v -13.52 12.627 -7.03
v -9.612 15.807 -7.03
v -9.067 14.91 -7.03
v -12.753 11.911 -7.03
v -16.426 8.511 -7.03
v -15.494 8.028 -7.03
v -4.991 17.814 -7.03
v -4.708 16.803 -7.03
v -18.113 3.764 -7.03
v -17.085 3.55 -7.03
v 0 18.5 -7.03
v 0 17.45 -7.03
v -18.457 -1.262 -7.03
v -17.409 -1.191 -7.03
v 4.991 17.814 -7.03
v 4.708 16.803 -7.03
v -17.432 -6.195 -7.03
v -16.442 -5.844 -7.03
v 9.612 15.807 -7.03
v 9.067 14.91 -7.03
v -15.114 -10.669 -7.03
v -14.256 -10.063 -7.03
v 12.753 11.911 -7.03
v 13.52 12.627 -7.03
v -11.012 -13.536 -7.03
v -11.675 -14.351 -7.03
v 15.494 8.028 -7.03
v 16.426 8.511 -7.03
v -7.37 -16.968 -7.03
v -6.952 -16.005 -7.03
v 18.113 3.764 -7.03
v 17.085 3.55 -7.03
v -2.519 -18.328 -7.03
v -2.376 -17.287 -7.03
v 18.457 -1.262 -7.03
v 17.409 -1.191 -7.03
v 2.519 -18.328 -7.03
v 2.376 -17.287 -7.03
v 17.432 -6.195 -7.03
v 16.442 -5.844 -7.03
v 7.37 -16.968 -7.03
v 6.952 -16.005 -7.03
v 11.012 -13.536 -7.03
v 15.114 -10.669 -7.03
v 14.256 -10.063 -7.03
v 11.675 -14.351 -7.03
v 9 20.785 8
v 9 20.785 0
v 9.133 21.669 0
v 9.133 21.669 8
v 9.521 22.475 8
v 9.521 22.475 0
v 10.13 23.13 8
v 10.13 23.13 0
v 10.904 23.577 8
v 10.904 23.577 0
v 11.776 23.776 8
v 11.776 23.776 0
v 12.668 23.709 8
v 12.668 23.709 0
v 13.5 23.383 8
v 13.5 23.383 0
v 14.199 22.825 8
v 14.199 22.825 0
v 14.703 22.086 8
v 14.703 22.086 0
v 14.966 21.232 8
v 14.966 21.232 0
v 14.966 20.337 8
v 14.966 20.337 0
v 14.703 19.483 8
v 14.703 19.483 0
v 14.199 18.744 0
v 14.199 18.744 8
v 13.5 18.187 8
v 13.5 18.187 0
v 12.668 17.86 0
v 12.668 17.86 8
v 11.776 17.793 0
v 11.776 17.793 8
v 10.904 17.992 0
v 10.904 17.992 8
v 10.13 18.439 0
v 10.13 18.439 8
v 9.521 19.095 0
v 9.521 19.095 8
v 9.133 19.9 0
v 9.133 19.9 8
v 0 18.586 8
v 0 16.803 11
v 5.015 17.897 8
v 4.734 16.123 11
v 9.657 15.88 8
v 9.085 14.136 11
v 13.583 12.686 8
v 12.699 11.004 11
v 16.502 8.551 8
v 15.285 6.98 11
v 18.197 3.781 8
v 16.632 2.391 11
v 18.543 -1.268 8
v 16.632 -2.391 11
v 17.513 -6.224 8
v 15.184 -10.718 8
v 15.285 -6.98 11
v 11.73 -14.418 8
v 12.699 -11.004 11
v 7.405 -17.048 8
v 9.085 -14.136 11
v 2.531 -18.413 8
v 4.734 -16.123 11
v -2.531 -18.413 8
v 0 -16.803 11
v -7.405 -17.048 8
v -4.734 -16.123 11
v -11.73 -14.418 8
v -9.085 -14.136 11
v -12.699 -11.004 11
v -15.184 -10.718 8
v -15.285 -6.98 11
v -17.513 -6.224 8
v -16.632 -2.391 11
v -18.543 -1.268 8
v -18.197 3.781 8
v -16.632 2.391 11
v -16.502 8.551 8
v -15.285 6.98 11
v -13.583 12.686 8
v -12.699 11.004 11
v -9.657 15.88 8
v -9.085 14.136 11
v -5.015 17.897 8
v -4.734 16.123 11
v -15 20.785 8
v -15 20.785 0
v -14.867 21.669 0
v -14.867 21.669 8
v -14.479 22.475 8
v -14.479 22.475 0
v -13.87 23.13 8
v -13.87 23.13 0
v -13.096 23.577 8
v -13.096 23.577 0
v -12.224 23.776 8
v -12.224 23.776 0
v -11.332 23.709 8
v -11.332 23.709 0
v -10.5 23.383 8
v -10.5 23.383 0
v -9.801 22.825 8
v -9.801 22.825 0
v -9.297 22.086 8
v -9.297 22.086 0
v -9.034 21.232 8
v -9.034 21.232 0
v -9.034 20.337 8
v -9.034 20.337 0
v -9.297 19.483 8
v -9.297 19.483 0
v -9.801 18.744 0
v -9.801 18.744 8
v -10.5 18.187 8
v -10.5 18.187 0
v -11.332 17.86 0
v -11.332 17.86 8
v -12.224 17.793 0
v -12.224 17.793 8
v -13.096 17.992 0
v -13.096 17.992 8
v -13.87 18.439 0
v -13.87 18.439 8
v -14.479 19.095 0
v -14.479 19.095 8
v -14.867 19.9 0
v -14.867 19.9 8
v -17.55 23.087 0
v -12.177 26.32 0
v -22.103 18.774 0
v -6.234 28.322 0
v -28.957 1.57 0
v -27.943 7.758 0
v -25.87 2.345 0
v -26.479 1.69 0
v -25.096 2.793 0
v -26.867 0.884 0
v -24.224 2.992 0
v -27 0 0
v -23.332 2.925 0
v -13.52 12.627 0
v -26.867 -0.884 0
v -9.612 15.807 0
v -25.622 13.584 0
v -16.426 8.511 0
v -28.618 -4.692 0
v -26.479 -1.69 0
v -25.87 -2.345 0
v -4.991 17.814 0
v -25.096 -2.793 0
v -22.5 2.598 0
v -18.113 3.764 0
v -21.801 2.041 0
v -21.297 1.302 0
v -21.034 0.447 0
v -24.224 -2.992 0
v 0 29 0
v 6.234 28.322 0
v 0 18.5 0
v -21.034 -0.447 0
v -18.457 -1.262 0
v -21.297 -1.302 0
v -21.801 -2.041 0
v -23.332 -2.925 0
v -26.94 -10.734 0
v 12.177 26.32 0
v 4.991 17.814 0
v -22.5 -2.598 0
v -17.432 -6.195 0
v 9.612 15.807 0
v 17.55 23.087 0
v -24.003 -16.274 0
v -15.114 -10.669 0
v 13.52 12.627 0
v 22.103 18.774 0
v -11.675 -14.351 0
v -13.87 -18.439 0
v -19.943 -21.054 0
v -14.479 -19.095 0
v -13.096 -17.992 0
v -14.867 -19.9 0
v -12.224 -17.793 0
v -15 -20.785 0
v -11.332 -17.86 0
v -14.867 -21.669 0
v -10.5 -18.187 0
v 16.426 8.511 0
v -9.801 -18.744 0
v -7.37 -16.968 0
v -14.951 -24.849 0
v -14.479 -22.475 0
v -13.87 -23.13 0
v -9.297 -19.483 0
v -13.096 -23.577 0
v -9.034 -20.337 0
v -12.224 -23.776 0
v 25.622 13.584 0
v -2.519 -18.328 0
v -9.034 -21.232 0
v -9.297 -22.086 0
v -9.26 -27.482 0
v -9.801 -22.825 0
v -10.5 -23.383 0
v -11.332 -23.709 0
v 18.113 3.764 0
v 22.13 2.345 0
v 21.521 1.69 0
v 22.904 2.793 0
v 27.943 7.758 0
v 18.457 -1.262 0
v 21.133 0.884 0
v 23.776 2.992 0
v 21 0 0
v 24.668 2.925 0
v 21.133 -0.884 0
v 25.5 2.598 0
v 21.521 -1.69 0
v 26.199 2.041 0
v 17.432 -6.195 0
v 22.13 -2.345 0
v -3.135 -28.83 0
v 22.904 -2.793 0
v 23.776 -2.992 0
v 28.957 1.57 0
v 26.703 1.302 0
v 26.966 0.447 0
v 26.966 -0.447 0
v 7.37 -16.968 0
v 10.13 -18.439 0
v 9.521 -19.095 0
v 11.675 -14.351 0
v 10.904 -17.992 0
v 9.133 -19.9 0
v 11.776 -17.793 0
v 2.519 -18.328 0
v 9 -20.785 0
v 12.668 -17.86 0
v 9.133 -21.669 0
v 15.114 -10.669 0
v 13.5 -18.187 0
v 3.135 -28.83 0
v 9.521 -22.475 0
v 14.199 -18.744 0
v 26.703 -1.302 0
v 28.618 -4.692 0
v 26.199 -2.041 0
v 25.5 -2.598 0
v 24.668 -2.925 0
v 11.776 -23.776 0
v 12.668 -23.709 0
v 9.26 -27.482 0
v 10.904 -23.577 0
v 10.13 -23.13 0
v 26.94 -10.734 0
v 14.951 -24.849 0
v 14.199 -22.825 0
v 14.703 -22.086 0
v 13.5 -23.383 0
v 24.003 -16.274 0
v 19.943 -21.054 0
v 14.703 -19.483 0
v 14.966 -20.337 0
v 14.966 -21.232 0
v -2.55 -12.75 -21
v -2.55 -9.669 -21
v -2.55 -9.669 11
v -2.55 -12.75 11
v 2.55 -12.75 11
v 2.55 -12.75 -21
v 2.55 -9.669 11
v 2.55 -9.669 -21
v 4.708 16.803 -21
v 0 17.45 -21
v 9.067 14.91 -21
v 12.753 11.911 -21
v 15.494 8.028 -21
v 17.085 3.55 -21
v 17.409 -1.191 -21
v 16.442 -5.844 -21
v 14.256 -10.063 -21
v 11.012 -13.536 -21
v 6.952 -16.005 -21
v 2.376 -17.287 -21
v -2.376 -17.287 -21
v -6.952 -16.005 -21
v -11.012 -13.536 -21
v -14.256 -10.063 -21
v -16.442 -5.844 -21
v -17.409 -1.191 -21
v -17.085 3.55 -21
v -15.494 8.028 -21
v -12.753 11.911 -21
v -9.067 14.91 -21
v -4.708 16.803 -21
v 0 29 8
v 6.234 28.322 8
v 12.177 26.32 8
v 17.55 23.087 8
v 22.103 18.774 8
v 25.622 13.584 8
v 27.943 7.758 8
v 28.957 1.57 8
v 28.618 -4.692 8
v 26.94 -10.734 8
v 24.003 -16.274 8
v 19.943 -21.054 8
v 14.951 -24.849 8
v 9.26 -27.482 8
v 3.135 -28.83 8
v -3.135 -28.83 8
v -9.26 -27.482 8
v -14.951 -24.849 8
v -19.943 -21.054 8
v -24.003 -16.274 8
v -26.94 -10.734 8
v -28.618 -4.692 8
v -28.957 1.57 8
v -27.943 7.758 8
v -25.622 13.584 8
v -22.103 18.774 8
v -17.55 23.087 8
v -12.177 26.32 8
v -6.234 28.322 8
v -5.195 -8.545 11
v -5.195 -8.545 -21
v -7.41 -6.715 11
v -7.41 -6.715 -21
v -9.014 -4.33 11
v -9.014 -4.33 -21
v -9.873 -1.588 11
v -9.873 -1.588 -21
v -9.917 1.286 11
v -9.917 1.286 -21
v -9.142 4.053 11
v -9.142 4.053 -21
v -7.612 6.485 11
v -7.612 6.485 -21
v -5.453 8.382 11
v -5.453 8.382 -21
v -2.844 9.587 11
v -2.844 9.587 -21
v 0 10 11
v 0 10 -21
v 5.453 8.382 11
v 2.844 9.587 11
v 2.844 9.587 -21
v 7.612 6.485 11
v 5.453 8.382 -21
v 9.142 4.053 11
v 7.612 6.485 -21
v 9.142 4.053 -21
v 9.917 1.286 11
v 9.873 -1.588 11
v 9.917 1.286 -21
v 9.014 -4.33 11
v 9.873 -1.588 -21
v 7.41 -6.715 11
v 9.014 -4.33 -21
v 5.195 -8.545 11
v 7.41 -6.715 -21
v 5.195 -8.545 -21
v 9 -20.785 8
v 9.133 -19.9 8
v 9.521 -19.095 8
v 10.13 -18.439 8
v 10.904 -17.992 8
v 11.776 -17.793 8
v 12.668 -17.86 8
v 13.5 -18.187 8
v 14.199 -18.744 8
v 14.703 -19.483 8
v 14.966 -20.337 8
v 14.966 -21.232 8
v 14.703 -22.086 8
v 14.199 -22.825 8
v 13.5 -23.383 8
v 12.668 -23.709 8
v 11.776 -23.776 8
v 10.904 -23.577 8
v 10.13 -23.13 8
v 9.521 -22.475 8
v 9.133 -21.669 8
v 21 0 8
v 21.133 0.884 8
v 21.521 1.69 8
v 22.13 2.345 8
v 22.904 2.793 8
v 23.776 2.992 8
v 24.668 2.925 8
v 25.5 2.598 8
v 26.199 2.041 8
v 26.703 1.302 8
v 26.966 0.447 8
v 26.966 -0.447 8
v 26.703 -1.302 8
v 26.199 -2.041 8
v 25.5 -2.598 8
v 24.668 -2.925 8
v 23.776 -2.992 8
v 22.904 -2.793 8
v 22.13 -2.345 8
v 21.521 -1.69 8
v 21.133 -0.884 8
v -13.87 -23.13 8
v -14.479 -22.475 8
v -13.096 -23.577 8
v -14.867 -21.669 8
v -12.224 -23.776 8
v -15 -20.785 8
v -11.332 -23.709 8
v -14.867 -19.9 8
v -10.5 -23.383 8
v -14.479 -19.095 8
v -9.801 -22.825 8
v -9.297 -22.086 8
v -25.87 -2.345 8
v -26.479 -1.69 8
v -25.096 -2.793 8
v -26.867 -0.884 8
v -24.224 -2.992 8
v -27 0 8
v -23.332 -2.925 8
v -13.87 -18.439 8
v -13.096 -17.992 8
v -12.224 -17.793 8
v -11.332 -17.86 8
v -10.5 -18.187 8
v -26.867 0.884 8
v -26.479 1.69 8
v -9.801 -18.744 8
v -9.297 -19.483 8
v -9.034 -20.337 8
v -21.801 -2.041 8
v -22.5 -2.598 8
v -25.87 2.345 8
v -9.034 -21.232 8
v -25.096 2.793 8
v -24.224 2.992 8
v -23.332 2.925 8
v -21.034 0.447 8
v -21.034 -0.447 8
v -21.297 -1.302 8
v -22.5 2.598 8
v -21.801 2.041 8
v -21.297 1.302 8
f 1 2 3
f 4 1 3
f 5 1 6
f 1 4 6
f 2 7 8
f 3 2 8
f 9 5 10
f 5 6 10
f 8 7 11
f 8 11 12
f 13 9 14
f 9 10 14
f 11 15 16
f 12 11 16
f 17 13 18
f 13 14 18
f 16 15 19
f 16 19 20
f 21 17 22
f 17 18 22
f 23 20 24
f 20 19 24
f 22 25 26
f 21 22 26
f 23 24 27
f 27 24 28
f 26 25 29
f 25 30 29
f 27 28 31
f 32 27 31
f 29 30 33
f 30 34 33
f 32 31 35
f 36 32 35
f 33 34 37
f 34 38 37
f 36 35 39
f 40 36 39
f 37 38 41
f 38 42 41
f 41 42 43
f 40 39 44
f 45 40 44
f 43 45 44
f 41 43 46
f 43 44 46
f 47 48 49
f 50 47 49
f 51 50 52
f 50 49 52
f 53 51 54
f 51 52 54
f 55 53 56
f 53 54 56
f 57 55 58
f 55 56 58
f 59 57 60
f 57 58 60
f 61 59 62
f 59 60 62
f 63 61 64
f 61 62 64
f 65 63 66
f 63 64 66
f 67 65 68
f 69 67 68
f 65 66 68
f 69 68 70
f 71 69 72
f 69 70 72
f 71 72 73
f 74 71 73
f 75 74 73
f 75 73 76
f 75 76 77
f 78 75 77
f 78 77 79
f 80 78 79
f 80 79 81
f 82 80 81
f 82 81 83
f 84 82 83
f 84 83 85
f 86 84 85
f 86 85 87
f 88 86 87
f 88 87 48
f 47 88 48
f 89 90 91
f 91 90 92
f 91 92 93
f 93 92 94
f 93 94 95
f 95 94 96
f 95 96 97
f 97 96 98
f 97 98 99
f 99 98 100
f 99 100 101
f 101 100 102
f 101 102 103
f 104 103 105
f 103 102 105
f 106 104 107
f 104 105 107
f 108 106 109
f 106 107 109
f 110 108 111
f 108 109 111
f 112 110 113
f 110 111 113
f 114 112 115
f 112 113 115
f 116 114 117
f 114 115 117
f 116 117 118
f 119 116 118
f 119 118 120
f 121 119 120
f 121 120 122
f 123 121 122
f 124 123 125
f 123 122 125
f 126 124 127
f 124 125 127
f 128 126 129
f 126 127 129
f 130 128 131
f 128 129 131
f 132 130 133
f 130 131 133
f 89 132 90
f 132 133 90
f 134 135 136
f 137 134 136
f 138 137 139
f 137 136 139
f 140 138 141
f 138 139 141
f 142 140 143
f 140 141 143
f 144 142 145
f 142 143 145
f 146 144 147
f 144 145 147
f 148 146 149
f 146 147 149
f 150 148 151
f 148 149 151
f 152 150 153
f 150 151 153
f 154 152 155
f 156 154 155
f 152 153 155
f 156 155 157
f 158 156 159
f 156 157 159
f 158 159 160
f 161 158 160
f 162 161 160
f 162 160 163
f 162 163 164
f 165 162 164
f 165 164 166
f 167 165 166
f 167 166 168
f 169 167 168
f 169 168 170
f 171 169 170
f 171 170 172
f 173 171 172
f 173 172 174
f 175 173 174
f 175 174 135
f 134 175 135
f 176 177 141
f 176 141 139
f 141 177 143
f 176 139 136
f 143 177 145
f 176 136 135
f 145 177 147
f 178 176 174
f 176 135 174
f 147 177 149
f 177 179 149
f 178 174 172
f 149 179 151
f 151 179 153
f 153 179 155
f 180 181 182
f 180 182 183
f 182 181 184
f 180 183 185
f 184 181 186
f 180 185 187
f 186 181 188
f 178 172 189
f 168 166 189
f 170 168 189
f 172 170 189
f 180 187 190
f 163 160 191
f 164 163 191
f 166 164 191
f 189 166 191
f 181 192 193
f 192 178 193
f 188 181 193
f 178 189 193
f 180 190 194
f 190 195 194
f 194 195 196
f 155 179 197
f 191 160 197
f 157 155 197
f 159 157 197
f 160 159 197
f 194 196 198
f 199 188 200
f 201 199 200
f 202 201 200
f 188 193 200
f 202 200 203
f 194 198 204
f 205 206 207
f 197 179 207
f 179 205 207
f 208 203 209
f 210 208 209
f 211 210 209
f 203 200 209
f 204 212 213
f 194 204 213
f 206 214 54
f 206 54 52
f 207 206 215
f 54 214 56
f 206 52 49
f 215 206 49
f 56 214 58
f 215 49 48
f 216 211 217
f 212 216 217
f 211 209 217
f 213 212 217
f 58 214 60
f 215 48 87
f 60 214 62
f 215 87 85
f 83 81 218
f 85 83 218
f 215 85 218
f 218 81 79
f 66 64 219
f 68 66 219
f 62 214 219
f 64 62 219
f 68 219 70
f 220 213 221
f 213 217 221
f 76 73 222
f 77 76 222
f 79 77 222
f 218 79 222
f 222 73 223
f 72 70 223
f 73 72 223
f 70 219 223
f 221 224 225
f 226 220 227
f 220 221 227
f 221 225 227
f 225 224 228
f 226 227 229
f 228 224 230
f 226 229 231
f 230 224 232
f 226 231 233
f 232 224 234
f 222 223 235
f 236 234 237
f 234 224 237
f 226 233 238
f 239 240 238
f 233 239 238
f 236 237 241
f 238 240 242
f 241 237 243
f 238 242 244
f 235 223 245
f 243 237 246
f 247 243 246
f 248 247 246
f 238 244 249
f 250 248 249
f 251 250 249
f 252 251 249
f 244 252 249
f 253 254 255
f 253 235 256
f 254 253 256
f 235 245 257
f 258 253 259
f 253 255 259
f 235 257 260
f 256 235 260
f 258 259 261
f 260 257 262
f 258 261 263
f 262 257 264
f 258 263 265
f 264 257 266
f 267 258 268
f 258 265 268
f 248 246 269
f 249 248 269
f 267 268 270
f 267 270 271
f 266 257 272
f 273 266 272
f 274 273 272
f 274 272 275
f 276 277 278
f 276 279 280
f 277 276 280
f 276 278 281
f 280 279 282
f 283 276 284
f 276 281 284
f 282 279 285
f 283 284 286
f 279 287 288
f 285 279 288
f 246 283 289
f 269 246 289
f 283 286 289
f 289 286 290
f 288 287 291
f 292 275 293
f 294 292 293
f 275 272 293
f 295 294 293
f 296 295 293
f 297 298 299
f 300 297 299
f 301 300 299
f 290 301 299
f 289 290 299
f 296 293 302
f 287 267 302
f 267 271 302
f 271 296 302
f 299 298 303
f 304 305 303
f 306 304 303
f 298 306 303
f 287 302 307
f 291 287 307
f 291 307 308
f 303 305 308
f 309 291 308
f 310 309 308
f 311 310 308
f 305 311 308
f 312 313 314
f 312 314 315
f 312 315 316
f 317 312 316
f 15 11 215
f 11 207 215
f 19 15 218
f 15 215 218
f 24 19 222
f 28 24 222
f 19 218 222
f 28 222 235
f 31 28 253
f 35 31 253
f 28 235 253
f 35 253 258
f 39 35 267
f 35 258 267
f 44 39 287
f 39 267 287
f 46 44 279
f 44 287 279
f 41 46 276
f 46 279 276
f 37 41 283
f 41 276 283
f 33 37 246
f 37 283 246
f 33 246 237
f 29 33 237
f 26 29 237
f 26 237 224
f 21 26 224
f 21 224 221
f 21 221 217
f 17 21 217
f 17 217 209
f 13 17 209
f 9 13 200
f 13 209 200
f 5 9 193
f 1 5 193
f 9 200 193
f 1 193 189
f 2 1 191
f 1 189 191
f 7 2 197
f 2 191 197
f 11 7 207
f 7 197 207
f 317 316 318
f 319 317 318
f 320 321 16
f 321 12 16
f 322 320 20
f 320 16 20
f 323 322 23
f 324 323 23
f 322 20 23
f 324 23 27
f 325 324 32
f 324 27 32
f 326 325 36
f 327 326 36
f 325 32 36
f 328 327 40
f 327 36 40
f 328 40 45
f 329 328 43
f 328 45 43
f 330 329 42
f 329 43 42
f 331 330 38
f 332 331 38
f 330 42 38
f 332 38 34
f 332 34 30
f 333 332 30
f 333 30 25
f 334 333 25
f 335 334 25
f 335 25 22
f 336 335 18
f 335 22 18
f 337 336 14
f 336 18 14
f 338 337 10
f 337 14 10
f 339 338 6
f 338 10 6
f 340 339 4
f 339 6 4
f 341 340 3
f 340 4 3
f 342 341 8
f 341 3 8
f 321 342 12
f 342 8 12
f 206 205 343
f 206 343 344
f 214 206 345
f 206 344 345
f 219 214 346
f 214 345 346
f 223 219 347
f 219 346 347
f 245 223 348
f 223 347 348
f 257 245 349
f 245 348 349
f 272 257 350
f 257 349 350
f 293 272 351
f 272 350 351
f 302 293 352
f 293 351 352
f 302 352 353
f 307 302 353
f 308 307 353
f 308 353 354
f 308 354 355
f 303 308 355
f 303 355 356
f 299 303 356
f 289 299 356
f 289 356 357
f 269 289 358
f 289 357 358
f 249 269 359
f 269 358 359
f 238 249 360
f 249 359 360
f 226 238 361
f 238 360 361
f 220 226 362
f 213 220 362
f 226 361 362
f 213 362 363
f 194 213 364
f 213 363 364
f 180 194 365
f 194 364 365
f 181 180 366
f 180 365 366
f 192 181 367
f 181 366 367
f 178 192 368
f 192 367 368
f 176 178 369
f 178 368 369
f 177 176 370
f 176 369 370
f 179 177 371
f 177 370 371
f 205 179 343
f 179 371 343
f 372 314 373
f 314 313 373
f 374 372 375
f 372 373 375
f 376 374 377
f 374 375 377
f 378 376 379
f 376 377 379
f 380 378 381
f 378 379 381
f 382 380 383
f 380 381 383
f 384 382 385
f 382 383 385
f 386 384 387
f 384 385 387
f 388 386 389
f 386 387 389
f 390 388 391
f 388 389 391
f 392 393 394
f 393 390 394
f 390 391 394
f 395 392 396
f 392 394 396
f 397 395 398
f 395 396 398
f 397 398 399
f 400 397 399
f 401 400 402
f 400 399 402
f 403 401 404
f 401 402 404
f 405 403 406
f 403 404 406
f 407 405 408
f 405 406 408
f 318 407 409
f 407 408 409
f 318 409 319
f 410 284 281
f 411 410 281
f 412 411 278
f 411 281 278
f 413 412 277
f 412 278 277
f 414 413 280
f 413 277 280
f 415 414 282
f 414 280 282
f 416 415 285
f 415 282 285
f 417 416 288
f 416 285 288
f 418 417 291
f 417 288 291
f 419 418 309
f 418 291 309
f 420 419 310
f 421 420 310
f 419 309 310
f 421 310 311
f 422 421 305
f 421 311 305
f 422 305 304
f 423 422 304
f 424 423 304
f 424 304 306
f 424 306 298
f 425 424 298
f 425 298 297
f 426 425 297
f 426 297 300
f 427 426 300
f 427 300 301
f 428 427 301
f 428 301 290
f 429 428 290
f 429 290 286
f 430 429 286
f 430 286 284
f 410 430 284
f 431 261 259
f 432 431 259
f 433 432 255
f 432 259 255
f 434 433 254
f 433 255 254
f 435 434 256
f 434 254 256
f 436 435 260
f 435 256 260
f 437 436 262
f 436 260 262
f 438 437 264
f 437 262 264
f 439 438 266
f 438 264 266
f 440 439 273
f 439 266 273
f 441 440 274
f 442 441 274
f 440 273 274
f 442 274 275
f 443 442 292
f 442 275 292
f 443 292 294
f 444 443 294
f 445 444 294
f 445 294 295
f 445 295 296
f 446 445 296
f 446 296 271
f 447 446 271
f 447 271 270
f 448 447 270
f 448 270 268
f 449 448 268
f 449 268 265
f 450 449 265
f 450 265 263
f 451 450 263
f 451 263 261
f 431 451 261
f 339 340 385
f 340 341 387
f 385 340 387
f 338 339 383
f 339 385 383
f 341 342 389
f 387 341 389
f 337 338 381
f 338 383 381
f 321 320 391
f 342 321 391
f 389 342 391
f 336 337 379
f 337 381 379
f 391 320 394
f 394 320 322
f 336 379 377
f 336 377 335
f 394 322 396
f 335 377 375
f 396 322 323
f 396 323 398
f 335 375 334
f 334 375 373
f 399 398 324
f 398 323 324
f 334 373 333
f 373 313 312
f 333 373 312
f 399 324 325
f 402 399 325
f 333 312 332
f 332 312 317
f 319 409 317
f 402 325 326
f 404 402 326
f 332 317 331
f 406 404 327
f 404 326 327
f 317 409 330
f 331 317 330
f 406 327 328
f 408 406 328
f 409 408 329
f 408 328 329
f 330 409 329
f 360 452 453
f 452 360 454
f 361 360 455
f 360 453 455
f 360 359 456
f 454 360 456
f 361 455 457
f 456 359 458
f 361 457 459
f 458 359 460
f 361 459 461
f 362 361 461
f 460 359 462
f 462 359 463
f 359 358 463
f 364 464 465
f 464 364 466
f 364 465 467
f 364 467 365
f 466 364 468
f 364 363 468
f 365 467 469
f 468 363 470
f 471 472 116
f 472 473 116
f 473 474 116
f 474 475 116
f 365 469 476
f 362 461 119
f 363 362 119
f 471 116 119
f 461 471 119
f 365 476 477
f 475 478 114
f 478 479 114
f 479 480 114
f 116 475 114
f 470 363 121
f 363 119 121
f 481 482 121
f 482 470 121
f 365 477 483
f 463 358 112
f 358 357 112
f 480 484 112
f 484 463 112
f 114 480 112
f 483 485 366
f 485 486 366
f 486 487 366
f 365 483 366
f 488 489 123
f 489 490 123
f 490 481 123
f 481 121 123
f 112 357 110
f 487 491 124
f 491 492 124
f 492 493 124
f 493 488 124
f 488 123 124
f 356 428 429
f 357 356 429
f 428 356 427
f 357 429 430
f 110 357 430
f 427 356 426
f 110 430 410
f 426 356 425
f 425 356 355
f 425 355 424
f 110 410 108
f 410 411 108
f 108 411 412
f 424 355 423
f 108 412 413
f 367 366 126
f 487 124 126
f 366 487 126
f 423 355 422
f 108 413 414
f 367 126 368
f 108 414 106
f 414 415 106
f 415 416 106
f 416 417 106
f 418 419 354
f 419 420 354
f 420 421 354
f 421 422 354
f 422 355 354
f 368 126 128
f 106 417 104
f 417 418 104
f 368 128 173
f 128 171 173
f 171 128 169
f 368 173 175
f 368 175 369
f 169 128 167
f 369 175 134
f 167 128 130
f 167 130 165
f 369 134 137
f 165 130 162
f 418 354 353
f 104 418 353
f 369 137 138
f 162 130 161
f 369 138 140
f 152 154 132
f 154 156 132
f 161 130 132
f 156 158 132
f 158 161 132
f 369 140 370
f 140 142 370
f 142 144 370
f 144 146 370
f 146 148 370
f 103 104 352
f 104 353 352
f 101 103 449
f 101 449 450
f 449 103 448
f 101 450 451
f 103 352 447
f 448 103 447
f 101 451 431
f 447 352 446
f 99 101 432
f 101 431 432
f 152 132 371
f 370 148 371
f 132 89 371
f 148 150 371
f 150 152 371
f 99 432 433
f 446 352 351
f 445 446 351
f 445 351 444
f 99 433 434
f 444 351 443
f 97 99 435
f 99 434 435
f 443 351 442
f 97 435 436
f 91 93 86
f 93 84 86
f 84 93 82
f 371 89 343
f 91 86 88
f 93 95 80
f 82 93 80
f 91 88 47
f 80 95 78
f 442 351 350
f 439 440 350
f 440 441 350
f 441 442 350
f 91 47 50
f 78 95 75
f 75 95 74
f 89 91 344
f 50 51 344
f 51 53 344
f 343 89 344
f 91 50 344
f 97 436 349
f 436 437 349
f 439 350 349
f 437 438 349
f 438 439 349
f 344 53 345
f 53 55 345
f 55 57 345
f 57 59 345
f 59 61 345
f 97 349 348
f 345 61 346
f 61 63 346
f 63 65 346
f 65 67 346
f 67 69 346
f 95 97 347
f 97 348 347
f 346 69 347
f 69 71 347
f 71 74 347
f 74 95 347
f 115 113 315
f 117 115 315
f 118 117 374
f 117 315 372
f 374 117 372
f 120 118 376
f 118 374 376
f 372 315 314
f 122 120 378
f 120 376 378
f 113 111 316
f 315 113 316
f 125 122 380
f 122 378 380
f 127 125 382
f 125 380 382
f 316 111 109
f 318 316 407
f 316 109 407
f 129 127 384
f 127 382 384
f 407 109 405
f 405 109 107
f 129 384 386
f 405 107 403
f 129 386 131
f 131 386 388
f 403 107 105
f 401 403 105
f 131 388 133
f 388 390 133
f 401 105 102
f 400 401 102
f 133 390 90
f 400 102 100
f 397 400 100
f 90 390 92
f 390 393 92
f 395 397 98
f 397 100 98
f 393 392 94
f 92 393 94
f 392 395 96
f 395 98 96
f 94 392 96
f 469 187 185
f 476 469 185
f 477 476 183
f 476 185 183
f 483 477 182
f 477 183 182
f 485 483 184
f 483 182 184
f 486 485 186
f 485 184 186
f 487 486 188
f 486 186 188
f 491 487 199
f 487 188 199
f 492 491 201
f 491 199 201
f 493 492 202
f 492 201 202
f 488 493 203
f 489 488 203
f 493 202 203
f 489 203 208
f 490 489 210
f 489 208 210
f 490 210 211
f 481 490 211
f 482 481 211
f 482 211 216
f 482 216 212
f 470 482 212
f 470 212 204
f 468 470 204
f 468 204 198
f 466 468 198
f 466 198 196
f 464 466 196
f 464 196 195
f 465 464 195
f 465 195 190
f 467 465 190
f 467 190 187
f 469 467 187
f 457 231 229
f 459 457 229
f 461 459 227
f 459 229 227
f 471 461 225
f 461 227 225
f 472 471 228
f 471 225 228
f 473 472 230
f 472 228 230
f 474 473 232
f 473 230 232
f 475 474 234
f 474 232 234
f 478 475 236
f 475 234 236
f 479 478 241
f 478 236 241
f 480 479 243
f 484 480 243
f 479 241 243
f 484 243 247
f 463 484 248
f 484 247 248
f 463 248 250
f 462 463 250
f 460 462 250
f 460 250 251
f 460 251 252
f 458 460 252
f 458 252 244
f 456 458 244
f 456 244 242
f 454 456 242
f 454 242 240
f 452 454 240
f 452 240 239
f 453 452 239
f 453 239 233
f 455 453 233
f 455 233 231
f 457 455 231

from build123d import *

# Parameters (mm, degrees)
CUT_EXTRUDE1_DEPTH      = 12
CUT_EXTRUDE1_DEPTH_BACK = 22
SKETCH3_R               = 3
CUT_EXTRUDE2_DEPTH      = 22
CUT_EXTRUDE2_DEPTH_BACK = 12


with BuildPart() as part:
    # Sketch1 → Revolve1 (revolve)
    with BuildSketch(Plane(origin=(0, 0, 0), x_dir=(0, 0, -1), z_dir=(1, 0, 0))):
        Polygon((21, 17.45), (7.03, 17.45), (7.03, 18.5), (0, 18.5), (0, 29), (-8, 29), (-8, 18.586235054), (-11, 16.803216346), (-11, 10), (21, 10), align=None)
    revolve(axis=Axis((0, 0, 11), (0, 0, -1)))

    # Sketch2 → Cut-Extrude1 (cut, two sides)
    with BuildSketch(Plane.XY) as cut_extrude1_sk:
        with BuildLine():
            Line((-2.55, -12.75), (2.55, -12.75))
            Line((2.55, -12.75), (2.55, -9.66941053))
            ThreePointArc((2.55, -9.66941053), (0, -10), (-2.55, -9.66941053))
            Line((-2.55, -9.66941053), (-2.55, -12.75))
        make_face()
    extrude(amount=CUT_EXTRUDE1_DEPTH, mode=Mode.SUBTRACT)
    extrude(cut_extrude1_sk.sketch, amount=-CUT_EXTRUDE1_DEPTH_BACK, mode=Mode.SUBTRACT)

    # Sketch3 → Cut-Extrude2 (cut, two sides)
    with BuildSketch(Plane(origin=(0, 0, 0), x_dir=(-1, 0, 0), z_dir=(0, 0, -1))) as cut_extrude2_sk:
        with Locations((-24, 0)):
            Circle(SKETCH3_R)
        with Locations((-12, 20.784609691)):
            Circle(SKETCH3_R)
        with Locations((12, 20.784609691)):
            Circle(SKETCH3_R)
        with Locations((24, 0)):
            Circle(SKETCH3_R)
        with Locations((12, -20.784609691)):
            Circle(SKETCH3_R)
        with Locations((-12, -20.784609691)):
            Circle(SKETCH3_R)
    extrude(amount=CUT_EXTRUDE2_DEPTH, mode=Mode.SUBTRACT)
    extrude(cut_extrude2_sk.sketch, amount=-CUT_EXTRUDE2_DEPTH_BACK, mode=Mode.SUBTRACT)


solid = part.part
